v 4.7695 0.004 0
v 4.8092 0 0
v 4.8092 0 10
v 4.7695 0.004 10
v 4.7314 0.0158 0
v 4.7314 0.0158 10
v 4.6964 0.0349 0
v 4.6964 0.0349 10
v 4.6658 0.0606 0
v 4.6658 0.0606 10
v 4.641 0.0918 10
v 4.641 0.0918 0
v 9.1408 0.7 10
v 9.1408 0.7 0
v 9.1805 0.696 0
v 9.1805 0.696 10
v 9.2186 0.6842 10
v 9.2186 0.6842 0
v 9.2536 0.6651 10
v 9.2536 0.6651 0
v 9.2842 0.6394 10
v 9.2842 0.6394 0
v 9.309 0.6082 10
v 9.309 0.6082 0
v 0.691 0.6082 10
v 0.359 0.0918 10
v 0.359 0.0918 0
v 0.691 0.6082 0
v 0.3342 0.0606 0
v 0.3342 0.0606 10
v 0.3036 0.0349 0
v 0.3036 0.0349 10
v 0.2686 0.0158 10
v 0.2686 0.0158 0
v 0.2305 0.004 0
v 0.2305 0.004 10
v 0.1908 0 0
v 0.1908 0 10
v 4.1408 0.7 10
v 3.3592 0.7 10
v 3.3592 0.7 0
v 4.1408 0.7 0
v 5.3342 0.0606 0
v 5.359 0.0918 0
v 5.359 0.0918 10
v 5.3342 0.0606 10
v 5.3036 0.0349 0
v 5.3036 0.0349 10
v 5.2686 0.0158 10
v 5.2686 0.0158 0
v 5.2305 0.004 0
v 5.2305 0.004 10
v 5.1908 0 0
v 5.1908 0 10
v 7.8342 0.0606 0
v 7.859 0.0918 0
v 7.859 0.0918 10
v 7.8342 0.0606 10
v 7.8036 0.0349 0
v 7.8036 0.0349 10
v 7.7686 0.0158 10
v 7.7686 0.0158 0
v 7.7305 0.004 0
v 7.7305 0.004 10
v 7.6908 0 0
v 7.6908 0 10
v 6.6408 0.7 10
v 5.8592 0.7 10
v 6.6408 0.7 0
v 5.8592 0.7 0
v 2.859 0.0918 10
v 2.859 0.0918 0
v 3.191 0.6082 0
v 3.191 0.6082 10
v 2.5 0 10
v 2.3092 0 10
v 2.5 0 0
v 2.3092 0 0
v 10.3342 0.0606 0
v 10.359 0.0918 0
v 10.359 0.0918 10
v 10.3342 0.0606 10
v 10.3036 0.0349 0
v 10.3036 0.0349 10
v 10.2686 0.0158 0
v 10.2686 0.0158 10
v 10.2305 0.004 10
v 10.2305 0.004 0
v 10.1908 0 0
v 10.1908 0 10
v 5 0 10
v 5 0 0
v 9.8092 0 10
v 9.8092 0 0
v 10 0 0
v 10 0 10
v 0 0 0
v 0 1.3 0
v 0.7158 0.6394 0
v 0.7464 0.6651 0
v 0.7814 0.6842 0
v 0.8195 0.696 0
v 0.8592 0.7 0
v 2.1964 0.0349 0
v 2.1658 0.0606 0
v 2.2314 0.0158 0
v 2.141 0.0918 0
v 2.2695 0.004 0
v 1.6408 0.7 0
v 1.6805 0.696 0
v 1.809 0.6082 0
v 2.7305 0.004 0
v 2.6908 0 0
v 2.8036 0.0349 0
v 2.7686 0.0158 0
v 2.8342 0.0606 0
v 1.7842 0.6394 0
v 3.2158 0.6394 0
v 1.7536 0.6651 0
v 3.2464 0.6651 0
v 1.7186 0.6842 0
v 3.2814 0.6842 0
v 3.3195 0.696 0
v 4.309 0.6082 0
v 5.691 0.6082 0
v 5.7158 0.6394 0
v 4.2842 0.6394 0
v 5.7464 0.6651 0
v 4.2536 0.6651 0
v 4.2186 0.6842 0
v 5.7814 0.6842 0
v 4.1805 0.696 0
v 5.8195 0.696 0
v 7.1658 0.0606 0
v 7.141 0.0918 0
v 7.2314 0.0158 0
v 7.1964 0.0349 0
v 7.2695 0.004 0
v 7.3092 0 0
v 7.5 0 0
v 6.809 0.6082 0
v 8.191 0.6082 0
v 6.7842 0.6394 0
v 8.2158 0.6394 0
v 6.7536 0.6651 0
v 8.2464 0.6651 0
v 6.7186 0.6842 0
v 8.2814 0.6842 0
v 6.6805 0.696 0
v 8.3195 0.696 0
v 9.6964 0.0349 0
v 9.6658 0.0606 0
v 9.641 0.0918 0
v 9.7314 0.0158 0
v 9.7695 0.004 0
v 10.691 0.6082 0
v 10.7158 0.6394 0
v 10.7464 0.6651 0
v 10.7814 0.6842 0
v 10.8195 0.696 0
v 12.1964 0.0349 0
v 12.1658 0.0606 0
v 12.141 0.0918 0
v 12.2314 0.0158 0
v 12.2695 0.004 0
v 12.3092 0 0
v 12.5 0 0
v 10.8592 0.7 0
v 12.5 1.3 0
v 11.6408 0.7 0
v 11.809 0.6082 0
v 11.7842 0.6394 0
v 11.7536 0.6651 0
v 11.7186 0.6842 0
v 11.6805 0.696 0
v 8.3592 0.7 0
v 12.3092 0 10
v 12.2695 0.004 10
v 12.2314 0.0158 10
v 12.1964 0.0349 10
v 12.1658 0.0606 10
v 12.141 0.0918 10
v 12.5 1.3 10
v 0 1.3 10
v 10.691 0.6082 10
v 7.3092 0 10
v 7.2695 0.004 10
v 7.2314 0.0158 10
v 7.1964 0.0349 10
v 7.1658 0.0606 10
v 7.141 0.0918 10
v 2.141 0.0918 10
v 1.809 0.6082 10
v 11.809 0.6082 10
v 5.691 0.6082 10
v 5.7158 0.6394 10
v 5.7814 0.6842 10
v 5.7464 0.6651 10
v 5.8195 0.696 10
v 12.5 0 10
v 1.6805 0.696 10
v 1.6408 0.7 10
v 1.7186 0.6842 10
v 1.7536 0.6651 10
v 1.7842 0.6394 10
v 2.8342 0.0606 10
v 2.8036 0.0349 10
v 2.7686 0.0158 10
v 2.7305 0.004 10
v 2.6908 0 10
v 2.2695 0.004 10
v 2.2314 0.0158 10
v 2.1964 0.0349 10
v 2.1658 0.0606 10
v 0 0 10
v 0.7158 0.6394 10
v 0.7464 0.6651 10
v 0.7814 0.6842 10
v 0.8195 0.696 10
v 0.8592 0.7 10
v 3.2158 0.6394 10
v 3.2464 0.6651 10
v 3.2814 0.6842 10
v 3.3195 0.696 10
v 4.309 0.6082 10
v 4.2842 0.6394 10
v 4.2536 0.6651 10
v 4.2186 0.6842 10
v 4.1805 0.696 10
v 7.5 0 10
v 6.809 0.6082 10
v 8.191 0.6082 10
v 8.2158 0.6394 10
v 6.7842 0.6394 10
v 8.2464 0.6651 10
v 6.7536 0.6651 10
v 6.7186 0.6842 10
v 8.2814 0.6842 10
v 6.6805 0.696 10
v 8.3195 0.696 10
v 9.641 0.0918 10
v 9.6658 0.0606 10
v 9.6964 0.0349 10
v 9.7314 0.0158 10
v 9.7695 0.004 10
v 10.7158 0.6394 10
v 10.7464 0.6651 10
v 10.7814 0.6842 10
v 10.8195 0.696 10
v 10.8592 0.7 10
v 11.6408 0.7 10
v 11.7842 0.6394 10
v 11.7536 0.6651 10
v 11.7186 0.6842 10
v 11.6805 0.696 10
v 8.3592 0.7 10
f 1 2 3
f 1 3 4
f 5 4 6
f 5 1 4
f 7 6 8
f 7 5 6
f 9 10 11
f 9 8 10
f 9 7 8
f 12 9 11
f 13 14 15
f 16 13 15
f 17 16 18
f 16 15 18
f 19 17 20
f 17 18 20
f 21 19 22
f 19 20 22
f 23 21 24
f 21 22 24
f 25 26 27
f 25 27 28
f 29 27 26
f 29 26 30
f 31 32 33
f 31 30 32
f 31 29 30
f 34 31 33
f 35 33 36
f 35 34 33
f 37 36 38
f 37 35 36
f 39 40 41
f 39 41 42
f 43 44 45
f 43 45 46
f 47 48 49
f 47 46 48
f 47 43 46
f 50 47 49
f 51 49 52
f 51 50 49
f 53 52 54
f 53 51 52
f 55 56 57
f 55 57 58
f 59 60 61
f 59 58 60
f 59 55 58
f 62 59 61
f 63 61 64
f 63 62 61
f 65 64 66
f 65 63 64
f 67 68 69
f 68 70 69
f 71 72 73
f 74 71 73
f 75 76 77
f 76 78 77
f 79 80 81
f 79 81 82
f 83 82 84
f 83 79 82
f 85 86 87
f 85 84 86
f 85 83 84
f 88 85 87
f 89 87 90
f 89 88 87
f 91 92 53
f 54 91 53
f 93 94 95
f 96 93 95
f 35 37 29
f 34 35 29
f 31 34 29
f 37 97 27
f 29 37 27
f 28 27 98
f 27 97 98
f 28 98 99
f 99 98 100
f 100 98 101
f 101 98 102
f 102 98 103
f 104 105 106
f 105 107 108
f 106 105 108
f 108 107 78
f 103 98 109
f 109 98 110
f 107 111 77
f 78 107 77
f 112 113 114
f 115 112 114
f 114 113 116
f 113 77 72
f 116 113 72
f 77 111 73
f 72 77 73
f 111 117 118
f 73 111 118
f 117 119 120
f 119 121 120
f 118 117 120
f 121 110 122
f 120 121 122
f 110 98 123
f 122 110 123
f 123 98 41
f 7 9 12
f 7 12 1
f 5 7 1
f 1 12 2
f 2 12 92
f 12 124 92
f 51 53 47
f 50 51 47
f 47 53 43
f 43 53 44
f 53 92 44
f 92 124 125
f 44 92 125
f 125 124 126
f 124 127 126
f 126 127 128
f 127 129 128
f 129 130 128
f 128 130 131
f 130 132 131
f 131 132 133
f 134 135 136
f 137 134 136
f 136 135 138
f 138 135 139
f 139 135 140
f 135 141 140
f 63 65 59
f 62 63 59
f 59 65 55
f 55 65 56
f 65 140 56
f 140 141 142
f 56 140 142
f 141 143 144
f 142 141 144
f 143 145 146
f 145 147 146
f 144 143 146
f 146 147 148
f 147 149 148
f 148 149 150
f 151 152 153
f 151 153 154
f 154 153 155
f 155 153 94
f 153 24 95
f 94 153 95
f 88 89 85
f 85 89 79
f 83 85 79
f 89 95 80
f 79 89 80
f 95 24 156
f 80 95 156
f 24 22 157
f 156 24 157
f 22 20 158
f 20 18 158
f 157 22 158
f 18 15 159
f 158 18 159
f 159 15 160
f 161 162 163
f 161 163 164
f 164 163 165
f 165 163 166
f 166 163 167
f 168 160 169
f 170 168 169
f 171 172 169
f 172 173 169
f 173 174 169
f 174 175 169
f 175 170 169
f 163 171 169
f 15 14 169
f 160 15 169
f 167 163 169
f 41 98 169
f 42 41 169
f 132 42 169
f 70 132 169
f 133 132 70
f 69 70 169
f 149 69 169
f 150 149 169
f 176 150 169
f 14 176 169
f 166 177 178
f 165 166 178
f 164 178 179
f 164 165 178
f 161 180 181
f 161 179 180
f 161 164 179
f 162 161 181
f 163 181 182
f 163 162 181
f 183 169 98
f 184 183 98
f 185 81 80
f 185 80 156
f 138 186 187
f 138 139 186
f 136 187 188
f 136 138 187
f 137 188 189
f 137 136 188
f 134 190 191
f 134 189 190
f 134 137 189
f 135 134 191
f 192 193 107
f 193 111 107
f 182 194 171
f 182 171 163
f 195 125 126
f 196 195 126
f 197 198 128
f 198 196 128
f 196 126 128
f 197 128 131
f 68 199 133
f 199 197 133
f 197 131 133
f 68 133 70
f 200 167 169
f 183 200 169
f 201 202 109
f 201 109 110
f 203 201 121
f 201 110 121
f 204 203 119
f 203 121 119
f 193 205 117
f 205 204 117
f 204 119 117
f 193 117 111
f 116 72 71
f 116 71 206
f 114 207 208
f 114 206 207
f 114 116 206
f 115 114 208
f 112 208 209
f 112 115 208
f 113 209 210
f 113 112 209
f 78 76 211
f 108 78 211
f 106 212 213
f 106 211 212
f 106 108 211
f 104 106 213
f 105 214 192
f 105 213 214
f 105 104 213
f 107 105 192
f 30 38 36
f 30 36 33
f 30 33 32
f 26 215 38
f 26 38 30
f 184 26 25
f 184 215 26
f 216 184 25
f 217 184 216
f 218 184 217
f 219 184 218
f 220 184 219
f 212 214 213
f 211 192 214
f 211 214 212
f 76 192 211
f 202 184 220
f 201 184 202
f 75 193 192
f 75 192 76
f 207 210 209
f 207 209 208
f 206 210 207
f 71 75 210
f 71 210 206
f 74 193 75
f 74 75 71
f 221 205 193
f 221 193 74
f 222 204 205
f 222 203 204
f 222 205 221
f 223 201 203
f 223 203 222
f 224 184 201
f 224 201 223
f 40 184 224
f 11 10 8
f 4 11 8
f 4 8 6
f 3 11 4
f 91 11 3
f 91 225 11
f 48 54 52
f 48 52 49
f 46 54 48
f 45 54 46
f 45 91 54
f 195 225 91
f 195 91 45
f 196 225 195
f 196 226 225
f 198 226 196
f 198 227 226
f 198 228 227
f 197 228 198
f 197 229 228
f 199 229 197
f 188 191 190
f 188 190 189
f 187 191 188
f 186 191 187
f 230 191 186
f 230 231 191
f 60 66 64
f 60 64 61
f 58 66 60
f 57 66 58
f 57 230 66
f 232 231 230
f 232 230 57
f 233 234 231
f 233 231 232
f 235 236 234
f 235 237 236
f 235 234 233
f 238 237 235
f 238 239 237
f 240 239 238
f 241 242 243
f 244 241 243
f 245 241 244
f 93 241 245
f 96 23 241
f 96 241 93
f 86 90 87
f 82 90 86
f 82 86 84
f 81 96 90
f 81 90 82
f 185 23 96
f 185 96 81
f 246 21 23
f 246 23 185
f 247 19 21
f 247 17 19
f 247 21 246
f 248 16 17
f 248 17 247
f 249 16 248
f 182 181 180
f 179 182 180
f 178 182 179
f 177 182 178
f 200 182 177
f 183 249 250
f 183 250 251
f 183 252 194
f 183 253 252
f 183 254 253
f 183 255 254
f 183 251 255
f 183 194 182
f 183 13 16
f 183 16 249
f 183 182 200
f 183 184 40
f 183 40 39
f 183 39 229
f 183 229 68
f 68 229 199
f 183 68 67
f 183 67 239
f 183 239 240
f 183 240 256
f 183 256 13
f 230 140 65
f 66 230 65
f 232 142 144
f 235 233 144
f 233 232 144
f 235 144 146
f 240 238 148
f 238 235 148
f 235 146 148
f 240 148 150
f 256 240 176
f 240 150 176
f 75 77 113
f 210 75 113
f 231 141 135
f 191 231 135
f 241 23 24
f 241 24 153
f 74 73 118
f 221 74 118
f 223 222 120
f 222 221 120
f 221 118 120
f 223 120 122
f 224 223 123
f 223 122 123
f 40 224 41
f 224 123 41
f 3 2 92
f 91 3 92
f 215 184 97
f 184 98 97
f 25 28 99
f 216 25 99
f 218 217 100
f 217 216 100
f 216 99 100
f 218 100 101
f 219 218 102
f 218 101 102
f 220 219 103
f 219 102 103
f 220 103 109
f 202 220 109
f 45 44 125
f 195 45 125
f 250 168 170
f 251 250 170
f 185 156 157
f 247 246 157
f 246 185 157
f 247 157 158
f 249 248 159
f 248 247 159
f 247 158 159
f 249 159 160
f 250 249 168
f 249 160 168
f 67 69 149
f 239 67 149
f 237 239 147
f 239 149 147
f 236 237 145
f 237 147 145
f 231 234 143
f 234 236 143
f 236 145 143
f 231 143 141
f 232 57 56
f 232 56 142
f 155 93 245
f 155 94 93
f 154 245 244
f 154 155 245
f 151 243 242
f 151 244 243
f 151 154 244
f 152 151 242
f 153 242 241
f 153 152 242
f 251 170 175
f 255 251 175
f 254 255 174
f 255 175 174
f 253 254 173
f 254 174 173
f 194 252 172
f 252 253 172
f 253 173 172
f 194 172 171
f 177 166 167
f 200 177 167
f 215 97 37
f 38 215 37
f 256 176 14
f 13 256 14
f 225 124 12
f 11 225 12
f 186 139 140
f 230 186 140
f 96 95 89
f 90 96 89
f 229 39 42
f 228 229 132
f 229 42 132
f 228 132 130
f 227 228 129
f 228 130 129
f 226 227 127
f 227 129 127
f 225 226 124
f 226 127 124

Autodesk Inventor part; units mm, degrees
ref_plane "YZ Plane" through (0, 0, 0) normal (1, 0, 0) x (0, 1, 0)
ref_plane "XZ Plane" through (0, 0, 0) normal (0, 1, 0) x (-1, 0, 0)
ref_plane "XY Plane" through (0, 0, 0) normal (0, 0, 1) x (1, 0, 0)
sketch "Sketch1" plane through (0, 0, 0) normal (0, 0, 1) x (1, 0, 0)
  line L0 (10, 0) -> (10.1908, 0)
  line L1 (10.359, 0.0918) -> (10.691, 0.6082)
  line L2 (11.809, 0.6082) -> (12.141, 0.0918)
  line L3 (10.8592, 0.7) -> (11.6408, 0.7)
  arc A0 (11.809, 0.6082) -> (11.6408, 0.7) centre (11.6408, 0.5) ccw
  arc A1 (10.8592, 0.7) -> (10.691, 0.6082) centre (10.8592, 0.5) ccw
  line L4 (12.3092, 0) -> (12.5, 0)
  arc A2 (10.1908, 0) -> (10.359, 0.0918) centre (10.1908, 0.2) ccw
  arc A3 (12.141, 0.0918) -> (12.3092, 0) centre (12.3092, 0.2) ccw
  line L5 (7.5, 0) -> (7.6908, 0)
  line L6 (7.859, 0.0918) -> (8.191, 0.6082)
  line L7 (9.309, 0.6082) -> (9.641, 0.0918)
  line L8 (8.3592, 0.7) -> (9.1408, 0.7)
  arc A4 (9.309, 0.6082) -> (9.1408, 0.7) centre (9.1408, 0.5) ccw
  arc A5 (8.3592, 0.7) -> (8.191, 0.6082) centre (8.3592, 0.5) ccw
  line L9 (9.8092, 0) -> (10, 0)
  arc A6 (7.6908, 0) -> (7.859, 0.0918) centre (7.6908, 0.2) ccw
  arc A7 (9.641, 0.0918) -> (9.8092, 0) centre (9.8092, 0.2) ccw
  line L10 (5, 0) -> (5.1908, 0)
  line L11 (5.359, 0.0918) -> (5.691, 0.6082)
  line L12 (6.809, 0.6082) -> (7.141, 0.0918)
  line L13 (5.8592, 0.7) -> (6.6408, 0.7)
  arc A8 (6.809, 0.6082) -> (6.6408, 0.7) centre (6.6408, 0.5) ccw
  arc A9 (5.8592, 0.7) -> (5.691, 0.6082) centre (5.8592, 0.5) ccw
  line L14 (7.3092, 0) -> (7.5, 0)
  arc A10 (5.1908, 0) -> (5.359, 0.0918) centre (5.1908, 0.2) ccw
  arc A11 (7.141, 0.0918) -> (7.3092, 0) centre (7.3092, 0.2) ccw
  line L15 (2.5, 0) -> (2.6908, 0)
  line L16 (2.859, 0.0918) -> (3.191, 0.6082)
  line L17 (4.309, 0.6082) -> (4.641, 0.0918)
  line L18 (3.3592, 0.7) -> (4.1408, 0.7)
  arc A12 (4.309, 0.6082) -> (4.1408, 0.7) centre (4.1408, 0.5) ccw
  arc A13 (3.3592, 0.7) -> (3.191, 0.6082) centre (3.3592, 0.5) ccw
  line L19 (4.8092, 0) -> (5, 0)
  arc A14 (2.6908, 0) -> (2.859, 0.0918) centre (2.6908, 0.2) ccw
  arc A15 (4.641, 0.0918) -> (4.8092, 0) centre (4.8092, 0.2) ccw
  line L20 (0, 0) -> (0.1908, 0)
  line L21 (0.359, 0.0918) -> (0.691, 0.6082)
  line L22 (1.809, 0.6082) -> (2.141, 0.0918)
  line L23 (0.8592, 0.7) -> (1.6408, 0.7)
  arc A16 (1.809, 0.6082) -> (1.6408, 0.7) centre (1.6408, 0.5) ccw
  arc A17 (0.8592, 0.7) -> (0.691, 0.6082) centre (0.8592, 0.5) ccw
  line L24 (2.3092, 0) -> (2.5, 0)
  arc A18 (0.1908, 0) -> (0.359, 0.0918) centre (0.1908, 0.2) ccw
  arc A19 (2.141, 0.0918) -> (2.3092, 0) centre (2.3092, 0.2) ccw
  line L25 (12.5, 0) -> (12.5, 1.3)
  line L26 (12.5, 1.3) -> (0, 1.3)
  line L27 (0, 1.3) -> (0, 0)
  line L28 (7.3092, 0) -> (7.6908, 0)
  line L29 (9.8092, 0) -> (10.1908, 0)
  line L30 (12.3092, 0) -> (12.5, 0)
  line L31 (4.8092, 0) -> (5.1908, 0)
  line L32 (0, 0) -> (0.1908, 0)
  line L33 (2.3092, 0) -> (2.6908, 0)
  point P0 (0, 0)
  point P1 (10.3, 0)
  point P2 (12.2, 0)
  point P3 (7.8, 0)
  point P4 (9.7, 0)
  point P5 (5.3, 0)
  point P6 (7.2, 0)
  point P7 (2.8, 0)
  point P8 (4.7, 0)
  point P9 (0.3, 0)
  point P10 (2.2, 0)
  dimension "d14" = 10
  dimension "d5" = 0.3
  dimension "d7" = 0.2
  dimension "d8" = 0.2
  dimension "d11" = 2.5
  dimension "d16" = 1.3
extrude "Extrusion1" add sketch "Sketch1" along normal blind 10
pattern_of_one "Rectangular Pattern1"
properties part number "T2.5 belt-01" material "Rubber"
